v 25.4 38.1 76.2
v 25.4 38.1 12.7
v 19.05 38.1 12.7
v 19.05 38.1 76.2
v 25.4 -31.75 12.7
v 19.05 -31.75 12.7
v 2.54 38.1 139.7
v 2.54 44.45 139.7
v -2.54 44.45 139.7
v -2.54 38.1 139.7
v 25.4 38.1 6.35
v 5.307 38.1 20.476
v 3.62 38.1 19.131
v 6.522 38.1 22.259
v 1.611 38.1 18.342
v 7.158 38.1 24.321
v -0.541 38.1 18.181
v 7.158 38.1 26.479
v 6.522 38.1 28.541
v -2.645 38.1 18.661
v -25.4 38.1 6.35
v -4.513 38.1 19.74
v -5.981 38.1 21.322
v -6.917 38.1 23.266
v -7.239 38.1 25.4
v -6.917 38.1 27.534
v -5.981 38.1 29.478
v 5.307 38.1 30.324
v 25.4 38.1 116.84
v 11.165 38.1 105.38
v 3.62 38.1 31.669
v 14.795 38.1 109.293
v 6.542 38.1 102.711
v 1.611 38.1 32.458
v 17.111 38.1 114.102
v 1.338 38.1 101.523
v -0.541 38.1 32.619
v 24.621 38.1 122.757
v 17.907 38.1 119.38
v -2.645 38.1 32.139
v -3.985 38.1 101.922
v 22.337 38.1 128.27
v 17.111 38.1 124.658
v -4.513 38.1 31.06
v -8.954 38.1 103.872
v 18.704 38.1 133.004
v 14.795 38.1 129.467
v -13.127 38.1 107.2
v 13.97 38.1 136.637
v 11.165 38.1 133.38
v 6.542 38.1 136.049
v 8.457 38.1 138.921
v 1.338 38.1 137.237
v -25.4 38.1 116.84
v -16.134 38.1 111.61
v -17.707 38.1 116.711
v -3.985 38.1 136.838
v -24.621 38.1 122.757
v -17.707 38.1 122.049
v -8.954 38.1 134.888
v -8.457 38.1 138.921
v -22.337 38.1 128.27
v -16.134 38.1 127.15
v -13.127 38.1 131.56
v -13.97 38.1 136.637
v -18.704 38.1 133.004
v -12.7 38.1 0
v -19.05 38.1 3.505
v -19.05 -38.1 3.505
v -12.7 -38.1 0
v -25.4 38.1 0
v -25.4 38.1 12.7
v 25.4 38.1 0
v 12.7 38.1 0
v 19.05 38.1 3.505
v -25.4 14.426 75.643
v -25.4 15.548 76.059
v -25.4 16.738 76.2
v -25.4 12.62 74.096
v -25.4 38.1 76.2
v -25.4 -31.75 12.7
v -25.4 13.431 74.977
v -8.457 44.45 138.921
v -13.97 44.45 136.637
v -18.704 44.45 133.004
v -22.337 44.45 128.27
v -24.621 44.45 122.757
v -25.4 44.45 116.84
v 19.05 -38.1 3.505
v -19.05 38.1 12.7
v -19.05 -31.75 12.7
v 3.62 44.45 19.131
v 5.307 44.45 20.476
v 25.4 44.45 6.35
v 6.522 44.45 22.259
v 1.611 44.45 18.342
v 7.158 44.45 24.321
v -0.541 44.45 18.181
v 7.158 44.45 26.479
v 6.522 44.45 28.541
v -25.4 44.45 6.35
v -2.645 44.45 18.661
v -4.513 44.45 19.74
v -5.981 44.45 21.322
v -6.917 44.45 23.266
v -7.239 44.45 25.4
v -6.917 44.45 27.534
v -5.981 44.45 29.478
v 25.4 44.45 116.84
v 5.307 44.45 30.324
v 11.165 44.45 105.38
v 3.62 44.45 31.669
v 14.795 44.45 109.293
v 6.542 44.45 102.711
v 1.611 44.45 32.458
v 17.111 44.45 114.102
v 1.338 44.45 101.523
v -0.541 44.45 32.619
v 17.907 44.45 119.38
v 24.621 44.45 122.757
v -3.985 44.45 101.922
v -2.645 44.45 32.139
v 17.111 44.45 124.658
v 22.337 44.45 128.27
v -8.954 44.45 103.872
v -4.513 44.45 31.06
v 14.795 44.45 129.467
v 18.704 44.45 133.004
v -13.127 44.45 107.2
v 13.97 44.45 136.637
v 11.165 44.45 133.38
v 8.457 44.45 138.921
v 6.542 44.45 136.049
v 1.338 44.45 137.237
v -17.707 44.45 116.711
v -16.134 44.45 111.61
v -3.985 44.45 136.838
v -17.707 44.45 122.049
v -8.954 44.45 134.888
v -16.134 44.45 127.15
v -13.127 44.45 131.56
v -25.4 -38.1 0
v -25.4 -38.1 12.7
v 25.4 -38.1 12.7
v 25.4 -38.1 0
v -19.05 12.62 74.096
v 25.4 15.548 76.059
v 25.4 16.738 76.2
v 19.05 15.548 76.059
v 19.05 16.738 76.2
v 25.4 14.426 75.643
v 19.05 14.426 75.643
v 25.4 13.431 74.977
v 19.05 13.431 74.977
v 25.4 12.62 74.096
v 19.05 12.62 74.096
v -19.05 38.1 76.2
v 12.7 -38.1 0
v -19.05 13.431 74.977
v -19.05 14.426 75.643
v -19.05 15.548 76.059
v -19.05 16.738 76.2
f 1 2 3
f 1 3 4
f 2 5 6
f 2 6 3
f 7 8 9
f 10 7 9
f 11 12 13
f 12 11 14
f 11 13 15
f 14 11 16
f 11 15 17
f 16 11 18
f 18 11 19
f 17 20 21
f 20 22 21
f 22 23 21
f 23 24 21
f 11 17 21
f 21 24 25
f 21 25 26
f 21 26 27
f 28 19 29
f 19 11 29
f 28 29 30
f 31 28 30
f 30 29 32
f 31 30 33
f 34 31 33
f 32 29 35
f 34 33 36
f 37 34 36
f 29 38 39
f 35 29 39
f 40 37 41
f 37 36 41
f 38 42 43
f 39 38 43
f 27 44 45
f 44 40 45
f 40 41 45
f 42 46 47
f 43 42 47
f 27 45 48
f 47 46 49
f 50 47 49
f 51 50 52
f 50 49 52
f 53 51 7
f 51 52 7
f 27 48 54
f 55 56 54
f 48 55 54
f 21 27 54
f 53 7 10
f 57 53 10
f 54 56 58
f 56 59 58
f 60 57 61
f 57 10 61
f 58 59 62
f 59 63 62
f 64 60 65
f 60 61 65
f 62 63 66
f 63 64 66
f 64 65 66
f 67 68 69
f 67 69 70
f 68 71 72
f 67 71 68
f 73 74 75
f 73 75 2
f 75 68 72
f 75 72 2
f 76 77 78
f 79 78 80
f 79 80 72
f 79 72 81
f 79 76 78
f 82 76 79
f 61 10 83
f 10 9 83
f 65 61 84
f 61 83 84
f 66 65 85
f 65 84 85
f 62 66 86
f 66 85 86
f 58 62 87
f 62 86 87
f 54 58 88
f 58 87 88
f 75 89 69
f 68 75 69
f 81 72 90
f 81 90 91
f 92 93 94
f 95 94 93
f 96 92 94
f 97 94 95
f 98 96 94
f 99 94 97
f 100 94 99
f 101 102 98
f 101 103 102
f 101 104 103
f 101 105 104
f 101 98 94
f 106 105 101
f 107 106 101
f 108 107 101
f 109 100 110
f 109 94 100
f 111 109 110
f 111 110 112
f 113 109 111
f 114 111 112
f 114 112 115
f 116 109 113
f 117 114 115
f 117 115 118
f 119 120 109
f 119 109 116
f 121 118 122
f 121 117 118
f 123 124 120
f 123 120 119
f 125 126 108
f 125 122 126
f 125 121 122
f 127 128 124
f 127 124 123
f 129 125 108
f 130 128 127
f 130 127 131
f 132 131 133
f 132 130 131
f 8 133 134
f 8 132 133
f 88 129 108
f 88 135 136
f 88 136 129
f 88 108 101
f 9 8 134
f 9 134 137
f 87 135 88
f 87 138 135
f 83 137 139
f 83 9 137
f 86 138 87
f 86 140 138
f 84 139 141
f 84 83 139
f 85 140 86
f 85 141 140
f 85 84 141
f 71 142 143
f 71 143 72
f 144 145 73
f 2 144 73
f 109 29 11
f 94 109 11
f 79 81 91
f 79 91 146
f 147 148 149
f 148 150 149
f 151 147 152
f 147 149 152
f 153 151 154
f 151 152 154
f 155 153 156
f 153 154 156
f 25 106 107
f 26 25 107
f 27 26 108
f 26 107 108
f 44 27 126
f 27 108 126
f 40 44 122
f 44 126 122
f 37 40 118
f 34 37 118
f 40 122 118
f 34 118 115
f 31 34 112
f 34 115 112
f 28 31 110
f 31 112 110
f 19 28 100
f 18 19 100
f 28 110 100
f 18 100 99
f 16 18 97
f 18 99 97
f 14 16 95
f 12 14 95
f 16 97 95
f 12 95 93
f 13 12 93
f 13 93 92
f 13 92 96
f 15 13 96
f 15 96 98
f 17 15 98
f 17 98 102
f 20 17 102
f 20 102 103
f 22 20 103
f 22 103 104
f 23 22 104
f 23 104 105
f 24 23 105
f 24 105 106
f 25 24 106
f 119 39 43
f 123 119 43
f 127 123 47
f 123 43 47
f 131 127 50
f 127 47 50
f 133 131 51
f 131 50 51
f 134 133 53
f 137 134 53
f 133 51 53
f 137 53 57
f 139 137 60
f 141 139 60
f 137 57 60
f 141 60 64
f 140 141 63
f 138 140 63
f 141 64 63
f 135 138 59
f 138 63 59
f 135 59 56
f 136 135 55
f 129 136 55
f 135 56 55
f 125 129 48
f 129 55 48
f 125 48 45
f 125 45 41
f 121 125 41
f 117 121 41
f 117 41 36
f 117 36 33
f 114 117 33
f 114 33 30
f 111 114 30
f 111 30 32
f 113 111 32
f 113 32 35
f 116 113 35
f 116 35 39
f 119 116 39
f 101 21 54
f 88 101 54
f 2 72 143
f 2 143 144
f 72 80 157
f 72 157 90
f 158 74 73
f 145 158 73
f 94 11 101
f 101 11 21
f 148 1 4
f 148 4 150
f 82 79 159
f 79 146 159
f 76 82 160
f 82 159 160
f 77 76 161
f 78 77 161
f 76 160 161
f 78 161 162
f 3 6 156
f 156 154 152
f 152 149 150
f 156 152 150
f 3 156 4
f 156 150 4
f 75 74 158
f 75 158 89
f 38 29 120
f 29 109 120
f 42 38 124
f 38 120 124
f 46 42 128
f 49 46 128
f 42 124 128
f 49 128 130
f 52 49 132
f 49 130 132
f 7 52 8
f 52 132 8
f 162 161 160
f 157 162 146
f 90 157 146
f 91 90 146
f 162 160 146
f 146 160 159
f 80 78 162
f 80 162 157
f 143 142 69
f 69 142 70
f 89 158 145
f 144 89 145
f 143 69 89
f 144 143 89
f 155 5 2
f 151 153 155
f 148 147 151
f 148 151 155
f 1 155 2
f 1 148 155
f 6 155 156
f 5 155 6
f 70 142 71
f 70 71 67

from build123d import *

# Parameters (mm, degrees)
F0_W      = 50.8
F0_H      = 76.2
F1_DEPTH  = 12.7
F2_W      = 50.8
F2_H      = 127
F2_H_2    = 6.35
F3_DEPTH  = 6.35
F5_DEPTH  = 6.35
F7_DEPTH  = 6.35
F8_R      = 5.08
F8_2_R    = 5.08
F9_R      = 17.907
F10_DEPTH = 25.4
F12_DEPTH = 82.55
F13_R     = 22.86
F14_R     = 7.239
F15_DEPTH = 82.551


# Not quite as in the source:
# - a feature names something its author has since deleted; it is built from what else it names


with BuildPart() as f1:
    # F0 (on Top) → F1 (new body)
    with BuildSketch(Plane.XY):
        Rectangle(F0_W, F0_H)
    extrude(amount=F1_DEPTH)

    # F11 (on face) → F12 (cut, through all)
    with BuildSketch(Plane.XZ.offset(38.1)):
        Polygon((-12.7, 0), (0, 0), (12.7, 0), (19.05, 3.5051606157), (-19.05, 3.5051606157), align=None)
    extrude(amount=-F12_DEPTH, mode=Mode.SUBTRACT)


with BuildPart() as f3:
    # F2 (on face) → F3 (new body)
    with BuildSketch(Plane(origin=(0, 38.1, 0), x_dir=(-1, 0, 0), z_dir=(0, 1, 0))):
        with Locations((0, 76.2)):
            Rectangle(F2_W, F2_H)
        with Locations((0, 9.525)):
            Rectangle(F2_W, F2_H_2)
    extrude(amount=F3_DEPTH)

    # F9 (on face) → F10 (cut)
    with BuildSketch(Plane.XZ.offset(-38.1)):
        with Locations((0, 119.38)):
            Circle(F9_R)
    extrude(amount=-F10_DEPTH, mode=Mode.SUBTRACT)

    # F13
    f13_edges = [f3.edges().sort_by_distance(p)[0] for p in [
        (25.4, 41.275, 139.7),
        (-25.4, 41.275, 139.7),
    ]]
    fillet(f13_edges, radius=F13_R)

    # F14 (on face) → F15 (cut, through all)
    with BuildSketch(Plane(origin=(0, 44.45, 0), x_dir=(-1, 0, 0), z_dir=(0, 1, 0))):
        with Locations((0, 25.4)):
            Circle(F14_R)
    extrude(amount=-F15_DEPTH, mode=Mode.SUBTRACT)


with BuildPart() as f5:
    # F4 (on face) → F5 (new body)
    with BuildSketch(Plane.YZ.offset(25.4)):
        Polygon((-31.75, 12.7), (38.1, 12.7), (38.1, 76.2), (14.1410465515, 76.2), align=None)
    extrude(amount=-F5_DEPTH)

    # F8#2
    f8_2_edges = [f5.edges().sort_by_distance(p)[0] for p in [
        (22.225, 14.141047, 76.2),
    ]]
    fillet(f8_2_edges, radius=F8_2_R)


with BuildPart() as f7:
    # F6 (on face) → F7 (new body)
    with BuildSketch(Plane(origin=(-25.4, 0, 0), x_dir=(0, -1, 0), z_dir=(-1, 0, 0))):
        Polygon((-38.1, 76.2), (-38.1, 12.7), (31.75, 12.7), (-14.1410465515, 76.2), align=None)
    extrude(amount=-F7_DEPTH)

    # F8
    f8_edges = [f7.edges().sort_by_distance(p)[0] for p in [
        (-22.225, 14.141047, 76.2),
    ]]
    fillet(f8_edges, radius=F8_R)


solid = Compound([f1.part, f3.part, f5.part, f7.part])
